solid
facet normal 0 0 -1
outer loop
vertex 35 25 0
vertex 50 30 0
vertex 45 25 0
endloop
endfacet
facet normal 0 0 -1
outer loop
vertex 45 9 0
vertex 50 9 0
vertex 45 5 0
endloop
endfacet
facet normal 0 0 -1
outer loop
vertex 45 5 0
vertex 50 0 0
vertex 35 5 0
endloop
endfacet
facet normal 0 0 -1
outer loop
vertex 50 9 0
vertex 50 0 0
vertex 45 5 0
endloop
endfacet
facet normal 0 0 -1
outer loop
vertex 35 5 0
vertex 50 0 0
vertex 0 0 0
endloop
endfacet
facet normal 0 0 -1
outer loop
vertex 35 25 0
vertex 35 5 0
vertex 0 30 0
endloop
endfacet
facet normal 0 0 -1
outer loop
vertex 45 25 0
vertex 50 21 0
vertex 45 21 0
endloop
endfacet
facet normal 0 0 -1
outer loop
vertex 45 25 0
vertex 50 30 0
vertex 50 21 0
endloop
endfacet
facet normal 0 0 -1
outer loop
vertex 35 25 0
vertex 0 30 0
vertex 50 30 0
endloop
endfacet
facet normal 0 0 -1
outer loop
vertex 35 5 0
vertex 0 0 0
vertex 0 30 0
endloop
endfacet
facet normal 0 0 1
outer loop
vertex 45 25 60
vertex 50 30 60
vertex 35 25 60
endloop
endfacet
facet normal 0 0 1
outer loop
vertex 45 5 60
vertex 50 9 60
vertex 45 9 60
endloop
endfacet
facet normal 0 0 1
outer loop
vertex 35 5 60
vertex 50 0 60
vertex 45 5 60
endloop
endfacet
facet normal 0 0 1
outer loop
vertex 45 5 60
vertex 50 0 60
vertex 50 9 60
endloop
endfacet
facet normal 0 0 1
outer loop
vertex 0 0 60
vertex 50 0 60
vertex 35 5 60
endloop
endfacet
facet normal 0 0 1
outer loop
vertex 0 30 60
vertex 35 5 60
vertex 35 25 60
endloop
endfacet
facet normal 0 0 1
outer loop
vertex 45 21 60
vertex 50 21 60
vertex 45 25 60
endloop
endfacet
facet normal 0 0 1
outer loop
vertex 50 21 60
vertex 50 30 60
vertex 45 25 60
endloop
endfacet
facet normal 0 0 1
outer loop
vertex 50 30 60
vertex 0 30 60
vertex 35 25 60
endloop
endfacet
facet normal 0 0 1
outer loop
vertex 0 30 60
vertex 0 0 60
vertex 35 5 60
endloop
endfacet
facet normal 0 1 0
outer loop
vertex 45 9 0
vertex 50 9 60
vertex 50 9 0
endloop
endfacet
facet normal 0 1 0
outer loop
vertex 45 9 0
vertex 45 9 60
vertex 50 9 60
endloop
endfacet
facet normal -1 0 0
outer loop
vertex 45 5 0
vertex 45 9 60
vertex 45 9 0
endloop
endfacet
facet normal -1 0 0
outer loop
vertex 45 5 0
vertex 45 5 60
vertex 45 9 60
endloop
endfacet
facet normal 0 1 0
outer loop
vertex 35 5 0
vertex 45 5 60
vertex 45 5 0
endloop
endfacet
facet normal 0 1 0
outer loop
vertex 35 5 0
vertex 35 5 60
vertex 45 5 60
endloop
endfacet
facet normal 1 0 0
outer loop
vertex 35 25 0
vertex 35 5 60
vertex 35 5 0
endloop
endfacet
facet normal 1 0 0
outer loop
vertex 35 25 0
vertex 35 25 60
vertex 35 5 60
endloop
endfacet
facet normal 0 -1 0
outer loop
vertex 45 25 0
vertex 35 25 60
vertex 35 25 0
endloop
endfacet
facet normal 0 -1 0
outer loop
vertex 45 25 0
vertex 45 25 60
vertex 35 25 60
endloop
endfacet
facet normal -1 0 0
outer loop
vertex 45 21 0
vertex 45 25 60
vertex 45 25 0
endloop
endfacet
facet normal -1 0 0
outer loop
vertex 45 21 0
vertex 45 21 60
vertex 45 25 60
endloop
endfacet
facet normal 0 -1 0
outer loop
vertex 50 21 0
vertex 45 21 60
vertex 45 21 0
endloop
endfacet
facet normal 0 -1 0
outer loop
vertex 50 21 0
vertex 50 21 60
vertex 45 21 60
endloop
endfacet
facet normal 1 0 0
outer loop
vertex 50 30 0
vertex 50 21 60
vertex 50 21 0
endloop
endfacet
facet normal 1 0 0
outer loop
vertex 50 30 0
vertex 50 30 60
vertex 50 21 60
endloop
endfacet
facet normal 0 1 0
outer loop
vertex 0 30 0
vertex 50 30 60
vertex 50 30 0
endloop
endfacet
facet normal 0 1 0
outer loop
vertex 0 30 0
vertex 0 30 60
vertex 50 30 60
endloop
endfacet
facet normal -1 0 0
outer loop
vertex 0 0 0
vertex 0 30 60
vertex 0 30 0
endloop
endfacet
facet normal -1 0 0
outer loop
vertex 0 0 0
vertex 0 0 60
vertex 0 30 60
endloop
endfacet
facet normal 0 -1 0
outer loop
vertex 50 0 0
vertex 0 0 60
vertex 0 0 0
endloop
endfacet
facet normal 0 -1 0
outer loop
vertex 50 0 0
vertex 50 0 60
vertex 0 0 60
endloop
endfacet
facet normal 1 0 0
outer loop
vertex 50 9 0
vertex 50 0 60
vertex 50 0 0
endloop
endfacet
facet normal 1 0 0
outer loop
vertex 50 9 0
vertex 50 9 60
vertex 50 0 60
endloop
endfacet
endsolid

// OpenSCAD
$fn = 32;

// ----------------------------------------------------------------------
// T-slot rail: 50 x 30 mm section, 60 mm long
// ----------------------------------------------------------------------

// --- parameters (mm) ---
profile_height = 60;      // extrusion height
profile_points = 12;      // points of the closed outline

profile = [[0, 0], [50, 0], [50, 9], [45, 9], [45, 5], [35, 5], [35, 25], [45, 25], [45, 21], [50, 21], [50, 30], [0, 30]];  // single closed polygon, 12 points, counter clockwise

// --- the one profile operation ---
linear_extrude(height = profile_height) polygon(points = profile);
